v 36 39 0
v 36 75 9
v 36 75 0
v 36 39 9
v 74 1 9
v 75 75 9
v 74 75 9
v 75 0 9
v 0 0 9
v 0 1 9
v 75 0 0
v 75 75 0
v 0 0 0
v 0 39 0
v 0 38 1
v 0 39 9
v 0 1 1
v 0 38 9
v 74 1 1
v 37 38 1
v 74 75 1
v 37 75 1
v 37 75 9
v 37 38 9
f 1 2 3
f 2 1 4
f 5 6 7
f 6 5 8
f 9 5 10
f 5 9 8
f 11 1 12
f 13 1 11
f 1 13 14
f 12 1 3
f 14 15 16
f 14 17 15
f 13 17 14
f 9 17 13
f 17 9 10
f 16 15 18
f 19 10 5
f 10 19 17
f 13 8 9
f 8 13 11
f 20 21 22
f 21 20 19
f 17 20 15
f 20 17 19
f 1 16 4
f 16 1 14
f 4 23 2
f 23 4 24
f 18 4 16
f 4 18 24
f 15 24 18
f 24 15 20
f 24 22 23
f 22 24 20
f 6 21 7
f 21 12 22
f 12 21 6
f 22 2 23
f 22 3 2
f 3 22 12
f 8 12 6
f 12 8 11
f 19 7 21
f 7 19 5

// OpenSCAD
//KrippeEckhalter
a=9; //18;
b=36;

t=1.0;
to=1.0;

module seite()
{
    //Seite so hoch wie Latte, so breit wie Latte, dick wie t
    cube([b,t,a]);
}

module seite2()
{
    translate([0,b+t+to,0])
    seite();
}

module seite3()
{
    cube([t,b,a]);
}

module seite4()
{
    translate([b+b+t+to,b+t+t+to,0])
    seite3();
}

color("blue")
seite();
//Unterteil Ecke Verlängerung 1 mit 2xt + Toleranz
cube([b,b+t+t+to,t]);
seite2();

translate([b,b+t+t+to,0])
seite3();

translate([b,b+t+t+to,0])
cube([b+t+t+to,b,t]);

color("red")
seite4();

translate([b,0,0])
cube([b+t+t+to,b+t+t+to,t]);

color("green")
translate([b,b+t+to,0])
cube([t,t,a]);

translate([b,0,0])
cube([b+t+t+to,t,a]);

color("yellow")
translate([b+b+t+to,t,0])
cube([t,b+t+to,a]);
